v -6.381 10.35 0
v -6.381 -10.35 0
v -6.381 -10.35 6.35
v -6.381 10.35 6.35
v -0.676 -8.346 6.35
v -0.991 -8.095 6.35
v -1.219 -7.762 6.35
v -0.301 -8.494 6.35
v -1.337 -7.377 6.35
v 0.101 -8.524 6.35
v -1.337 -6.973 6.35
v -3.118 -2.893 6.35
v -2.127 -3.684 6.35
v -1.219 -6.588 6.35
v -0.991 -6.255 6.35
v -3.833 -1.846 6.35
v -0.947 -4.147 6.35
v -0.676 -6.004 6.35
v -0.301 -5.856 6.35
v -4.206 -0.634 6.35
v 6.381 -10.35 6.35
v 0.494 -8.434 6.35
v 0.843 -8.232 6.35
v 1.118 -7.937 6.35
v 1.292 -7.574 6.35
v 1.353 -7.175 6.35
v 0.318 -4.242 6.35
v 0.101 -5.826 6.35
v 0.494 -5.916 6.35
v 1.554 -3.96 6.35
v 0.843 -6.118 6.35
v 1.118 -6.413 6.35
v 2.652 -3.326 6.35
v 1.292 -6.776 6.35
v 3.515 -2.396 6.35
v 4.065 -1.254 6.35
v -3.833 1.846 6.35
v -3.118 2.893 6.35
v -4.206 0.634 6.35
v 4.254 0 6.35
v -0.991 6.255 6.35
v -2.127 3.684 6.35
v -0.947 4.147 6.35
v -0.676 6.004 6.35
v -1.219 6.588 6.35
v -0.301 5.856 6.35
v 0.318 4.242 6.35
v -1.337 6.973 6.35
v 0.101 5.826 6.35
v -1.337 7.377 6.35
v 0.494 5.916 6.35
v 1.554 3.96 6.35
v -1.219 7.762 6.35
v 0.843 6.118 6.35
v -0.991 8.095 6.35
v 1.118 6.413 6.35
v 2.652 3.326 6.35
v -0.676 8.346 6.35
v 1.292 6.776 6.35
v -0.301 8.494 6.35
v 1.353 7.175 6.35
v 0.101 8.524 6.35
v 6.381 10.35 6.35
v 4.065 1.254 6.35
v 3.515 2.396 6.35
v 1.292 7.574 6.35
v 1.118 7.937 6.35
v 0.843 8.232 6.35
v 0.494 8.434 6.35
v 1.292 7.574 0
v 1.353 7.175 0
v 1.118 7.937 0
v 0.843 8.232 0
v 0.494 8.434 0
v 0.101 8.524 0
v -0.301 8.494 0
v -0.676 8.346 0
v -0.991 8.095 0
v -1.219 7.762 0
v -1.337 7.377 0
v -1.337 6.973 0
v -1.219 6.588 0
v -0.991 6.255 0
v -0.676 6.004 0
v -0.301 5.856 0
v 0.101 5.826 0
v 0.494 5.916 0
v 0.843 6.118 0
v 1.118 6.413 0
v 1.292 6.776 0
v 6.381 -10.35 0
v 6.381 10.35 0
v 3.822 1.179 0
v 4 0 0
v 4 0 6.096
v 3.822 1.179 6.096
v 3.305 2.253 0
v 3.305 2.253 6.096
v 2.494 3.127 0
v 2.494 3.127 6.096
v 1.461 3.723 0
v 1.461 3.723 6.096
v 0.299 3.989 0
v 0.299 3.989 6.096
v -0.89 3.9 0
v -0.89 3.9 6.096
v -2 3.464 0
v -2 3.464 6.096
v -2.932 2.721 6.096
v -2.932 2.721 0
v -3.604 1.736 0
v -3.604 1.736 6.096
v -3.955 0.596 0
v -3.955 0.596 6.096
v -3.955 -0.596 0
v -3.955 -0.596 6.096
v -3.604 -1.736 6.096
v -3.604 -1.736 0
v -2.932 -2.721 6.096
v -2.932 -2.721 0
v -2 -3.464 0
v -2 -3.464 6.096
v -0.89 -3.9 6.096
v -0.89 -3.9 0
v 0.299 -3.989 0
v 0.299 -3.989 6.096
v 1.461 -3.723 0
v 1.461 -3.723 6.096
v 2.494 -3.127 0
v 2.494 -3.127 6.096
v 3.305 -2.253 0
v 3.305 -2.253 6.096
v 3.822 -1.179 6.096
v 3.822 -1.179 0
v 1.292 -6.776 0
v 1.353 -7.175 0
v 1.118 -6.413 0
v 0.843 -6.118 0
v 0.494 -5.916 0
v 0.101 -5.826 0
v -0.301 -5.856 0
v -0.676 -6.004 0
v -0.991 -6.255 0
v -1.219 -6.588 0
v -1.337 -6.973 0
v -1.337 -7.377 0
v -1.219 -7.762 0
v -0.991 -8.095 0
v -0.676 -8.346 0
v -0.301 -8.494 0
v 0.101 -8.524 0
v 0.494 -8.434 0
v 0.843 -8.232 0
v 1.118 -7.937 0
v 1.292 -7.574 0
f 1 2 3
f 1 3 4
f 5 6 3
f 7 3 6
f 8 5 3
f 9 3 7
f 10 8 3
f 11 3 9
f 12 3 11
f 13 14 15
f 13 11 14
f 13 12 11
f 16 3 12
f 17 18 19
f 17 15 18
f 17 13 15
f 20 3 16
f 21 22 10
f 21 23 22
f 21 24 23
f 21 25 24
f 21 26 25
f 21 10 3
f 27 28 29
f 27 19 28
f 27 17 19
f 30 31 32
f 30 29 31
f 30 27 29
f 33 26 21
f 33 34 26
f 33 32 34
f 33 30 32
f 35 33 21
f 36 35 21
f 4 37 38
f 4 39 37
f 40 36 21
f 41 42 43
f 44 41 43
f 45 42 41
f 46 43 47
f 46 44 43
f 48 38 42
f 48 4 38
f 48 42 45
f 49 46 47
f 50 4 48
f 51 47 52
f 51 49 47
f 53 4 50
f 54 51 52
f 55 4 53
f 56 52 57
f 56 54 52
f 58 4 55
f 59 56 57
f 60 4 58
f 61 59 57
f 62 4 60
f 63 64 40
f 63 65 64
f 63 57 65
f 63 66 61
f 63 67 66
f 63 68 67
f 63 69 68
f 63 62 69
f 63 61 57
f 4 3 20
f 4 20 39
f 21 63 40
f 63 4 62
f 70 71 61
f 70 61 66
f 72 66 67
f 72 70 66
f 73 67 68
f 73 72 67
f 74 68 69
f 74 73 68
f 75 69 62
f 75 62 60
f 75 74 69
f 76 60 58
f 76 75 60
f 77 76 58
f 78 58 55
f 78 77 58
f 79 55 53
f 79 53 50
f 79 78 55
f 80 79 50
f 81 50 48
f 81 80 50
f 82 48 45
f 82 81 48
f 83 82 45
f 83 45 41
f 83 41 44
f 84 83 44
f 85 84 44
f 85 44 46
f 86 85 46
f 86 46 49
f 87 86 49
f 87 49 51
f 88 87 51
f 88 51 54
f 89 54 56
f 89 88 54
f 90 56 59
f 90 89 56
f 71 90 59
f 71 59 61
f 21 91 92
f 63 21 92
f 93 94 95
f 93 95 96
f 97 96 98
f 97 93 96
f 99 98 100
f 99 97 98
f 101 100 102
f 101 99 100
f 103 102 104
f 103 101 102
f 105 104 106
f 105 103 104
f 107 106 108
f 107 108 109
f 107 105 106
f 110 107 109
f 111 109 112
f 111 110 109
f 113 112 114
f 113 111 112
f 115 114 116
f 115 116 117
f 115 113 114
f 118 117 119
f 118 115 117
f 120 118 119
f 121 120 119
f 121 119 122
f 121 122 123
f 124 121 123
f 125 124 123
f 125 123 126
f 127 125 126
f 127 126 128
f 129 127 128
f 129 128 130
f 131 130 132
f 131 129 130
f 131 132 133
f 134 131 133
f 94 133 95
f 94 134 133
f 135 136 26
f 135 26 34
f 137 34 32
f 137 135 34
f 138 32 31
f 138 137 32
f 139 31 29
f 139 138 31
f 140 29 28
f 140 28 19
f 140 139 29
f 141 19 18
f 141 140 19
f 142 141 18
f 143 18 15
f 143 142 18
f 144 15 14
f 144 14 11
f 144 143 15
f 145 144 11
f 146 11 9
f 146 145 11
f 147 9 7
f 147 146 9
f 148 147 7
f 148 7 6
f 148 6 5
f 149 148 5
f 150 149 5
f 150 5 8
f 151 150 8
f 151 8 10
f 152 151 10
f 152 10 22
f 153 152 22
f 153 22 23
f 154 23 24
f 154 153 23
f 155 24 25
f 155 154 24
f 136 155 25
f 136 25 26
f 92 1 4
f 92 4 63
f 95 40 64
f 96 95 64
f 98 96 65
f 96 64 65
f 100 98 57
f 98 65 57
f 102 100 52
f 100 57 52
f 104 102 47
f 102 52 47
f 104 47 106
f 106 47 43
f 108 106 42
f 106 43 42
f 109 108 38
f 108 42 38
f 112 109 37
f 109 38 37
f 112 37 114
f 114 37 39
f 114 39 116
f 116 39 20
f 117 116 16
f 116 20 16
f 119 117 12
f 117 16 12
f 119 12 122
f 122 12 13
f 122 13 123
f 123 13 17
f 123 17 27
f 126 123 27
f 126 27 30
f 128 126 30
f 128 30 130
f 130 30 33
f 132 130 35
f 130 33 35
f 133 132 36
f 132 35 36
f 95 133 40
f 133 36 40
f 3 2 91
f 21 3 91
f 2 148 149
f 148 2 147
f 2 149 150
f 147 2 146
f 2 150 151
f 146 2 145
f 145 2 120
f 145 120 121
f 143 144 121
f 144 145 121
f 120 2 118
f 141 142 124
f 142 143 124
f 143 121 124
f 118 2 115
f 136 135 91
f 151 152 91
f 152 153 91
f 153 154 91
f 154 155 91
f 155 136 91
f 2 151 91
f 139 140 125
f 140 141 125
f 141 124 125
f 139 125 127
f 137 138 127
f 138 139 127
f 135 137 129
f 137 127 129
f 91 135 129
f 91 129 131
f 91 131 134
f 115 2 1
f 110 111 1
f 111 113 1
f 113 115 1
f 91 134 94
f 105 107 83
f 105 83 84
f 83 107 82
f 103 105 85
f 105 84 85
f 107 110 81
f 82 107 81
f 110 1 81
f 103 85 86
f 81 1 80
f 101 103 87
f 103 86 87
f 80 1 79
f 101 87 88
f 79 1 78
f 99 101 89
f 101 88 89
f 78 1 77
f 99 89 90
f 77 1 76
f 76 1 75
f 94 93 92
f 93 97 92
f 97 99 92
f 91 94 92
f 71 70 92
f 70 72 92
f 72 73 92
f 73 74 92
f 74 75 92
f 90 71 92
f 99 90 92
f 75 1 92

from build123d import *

# Parameters (mm, degrees)
F0_W     = 12.7625
F0_H     = 20.7
F0_R     = 1.35255
F0_R_2   = 4
F1_DEPTH = 6.35
F2_SIZE  = 0.254


# Not quite as in the source:
# - a feature names something its author has since deleted; it is built from what else it names


with BuildPart() as f1:
    # F0 (on Top) → F1 (new body)
    with BuildSketch(Plane.XY):
        Rectangle(F0_W, F0_H)
        with Locations((0, -7.175)):
            Circle(F0_R, mode=Mode.SUBTRACT)
        Circle(F0_R_2, mode=Mode.SUBTRACT)
        with Locations((0, 7.175)):
            Circle(F0_R, mode=Mode.SUBTRACT)
    extrude(amount=F1_DEPTH)

    # F2
    f2_edges = [f1.edges().sort_by_distance(p)[0] for p in [
        (-4, 0, 6.35),
    ]]
    chamfer(f2_edges, length=F2_SIZE)


solid = f1.part
